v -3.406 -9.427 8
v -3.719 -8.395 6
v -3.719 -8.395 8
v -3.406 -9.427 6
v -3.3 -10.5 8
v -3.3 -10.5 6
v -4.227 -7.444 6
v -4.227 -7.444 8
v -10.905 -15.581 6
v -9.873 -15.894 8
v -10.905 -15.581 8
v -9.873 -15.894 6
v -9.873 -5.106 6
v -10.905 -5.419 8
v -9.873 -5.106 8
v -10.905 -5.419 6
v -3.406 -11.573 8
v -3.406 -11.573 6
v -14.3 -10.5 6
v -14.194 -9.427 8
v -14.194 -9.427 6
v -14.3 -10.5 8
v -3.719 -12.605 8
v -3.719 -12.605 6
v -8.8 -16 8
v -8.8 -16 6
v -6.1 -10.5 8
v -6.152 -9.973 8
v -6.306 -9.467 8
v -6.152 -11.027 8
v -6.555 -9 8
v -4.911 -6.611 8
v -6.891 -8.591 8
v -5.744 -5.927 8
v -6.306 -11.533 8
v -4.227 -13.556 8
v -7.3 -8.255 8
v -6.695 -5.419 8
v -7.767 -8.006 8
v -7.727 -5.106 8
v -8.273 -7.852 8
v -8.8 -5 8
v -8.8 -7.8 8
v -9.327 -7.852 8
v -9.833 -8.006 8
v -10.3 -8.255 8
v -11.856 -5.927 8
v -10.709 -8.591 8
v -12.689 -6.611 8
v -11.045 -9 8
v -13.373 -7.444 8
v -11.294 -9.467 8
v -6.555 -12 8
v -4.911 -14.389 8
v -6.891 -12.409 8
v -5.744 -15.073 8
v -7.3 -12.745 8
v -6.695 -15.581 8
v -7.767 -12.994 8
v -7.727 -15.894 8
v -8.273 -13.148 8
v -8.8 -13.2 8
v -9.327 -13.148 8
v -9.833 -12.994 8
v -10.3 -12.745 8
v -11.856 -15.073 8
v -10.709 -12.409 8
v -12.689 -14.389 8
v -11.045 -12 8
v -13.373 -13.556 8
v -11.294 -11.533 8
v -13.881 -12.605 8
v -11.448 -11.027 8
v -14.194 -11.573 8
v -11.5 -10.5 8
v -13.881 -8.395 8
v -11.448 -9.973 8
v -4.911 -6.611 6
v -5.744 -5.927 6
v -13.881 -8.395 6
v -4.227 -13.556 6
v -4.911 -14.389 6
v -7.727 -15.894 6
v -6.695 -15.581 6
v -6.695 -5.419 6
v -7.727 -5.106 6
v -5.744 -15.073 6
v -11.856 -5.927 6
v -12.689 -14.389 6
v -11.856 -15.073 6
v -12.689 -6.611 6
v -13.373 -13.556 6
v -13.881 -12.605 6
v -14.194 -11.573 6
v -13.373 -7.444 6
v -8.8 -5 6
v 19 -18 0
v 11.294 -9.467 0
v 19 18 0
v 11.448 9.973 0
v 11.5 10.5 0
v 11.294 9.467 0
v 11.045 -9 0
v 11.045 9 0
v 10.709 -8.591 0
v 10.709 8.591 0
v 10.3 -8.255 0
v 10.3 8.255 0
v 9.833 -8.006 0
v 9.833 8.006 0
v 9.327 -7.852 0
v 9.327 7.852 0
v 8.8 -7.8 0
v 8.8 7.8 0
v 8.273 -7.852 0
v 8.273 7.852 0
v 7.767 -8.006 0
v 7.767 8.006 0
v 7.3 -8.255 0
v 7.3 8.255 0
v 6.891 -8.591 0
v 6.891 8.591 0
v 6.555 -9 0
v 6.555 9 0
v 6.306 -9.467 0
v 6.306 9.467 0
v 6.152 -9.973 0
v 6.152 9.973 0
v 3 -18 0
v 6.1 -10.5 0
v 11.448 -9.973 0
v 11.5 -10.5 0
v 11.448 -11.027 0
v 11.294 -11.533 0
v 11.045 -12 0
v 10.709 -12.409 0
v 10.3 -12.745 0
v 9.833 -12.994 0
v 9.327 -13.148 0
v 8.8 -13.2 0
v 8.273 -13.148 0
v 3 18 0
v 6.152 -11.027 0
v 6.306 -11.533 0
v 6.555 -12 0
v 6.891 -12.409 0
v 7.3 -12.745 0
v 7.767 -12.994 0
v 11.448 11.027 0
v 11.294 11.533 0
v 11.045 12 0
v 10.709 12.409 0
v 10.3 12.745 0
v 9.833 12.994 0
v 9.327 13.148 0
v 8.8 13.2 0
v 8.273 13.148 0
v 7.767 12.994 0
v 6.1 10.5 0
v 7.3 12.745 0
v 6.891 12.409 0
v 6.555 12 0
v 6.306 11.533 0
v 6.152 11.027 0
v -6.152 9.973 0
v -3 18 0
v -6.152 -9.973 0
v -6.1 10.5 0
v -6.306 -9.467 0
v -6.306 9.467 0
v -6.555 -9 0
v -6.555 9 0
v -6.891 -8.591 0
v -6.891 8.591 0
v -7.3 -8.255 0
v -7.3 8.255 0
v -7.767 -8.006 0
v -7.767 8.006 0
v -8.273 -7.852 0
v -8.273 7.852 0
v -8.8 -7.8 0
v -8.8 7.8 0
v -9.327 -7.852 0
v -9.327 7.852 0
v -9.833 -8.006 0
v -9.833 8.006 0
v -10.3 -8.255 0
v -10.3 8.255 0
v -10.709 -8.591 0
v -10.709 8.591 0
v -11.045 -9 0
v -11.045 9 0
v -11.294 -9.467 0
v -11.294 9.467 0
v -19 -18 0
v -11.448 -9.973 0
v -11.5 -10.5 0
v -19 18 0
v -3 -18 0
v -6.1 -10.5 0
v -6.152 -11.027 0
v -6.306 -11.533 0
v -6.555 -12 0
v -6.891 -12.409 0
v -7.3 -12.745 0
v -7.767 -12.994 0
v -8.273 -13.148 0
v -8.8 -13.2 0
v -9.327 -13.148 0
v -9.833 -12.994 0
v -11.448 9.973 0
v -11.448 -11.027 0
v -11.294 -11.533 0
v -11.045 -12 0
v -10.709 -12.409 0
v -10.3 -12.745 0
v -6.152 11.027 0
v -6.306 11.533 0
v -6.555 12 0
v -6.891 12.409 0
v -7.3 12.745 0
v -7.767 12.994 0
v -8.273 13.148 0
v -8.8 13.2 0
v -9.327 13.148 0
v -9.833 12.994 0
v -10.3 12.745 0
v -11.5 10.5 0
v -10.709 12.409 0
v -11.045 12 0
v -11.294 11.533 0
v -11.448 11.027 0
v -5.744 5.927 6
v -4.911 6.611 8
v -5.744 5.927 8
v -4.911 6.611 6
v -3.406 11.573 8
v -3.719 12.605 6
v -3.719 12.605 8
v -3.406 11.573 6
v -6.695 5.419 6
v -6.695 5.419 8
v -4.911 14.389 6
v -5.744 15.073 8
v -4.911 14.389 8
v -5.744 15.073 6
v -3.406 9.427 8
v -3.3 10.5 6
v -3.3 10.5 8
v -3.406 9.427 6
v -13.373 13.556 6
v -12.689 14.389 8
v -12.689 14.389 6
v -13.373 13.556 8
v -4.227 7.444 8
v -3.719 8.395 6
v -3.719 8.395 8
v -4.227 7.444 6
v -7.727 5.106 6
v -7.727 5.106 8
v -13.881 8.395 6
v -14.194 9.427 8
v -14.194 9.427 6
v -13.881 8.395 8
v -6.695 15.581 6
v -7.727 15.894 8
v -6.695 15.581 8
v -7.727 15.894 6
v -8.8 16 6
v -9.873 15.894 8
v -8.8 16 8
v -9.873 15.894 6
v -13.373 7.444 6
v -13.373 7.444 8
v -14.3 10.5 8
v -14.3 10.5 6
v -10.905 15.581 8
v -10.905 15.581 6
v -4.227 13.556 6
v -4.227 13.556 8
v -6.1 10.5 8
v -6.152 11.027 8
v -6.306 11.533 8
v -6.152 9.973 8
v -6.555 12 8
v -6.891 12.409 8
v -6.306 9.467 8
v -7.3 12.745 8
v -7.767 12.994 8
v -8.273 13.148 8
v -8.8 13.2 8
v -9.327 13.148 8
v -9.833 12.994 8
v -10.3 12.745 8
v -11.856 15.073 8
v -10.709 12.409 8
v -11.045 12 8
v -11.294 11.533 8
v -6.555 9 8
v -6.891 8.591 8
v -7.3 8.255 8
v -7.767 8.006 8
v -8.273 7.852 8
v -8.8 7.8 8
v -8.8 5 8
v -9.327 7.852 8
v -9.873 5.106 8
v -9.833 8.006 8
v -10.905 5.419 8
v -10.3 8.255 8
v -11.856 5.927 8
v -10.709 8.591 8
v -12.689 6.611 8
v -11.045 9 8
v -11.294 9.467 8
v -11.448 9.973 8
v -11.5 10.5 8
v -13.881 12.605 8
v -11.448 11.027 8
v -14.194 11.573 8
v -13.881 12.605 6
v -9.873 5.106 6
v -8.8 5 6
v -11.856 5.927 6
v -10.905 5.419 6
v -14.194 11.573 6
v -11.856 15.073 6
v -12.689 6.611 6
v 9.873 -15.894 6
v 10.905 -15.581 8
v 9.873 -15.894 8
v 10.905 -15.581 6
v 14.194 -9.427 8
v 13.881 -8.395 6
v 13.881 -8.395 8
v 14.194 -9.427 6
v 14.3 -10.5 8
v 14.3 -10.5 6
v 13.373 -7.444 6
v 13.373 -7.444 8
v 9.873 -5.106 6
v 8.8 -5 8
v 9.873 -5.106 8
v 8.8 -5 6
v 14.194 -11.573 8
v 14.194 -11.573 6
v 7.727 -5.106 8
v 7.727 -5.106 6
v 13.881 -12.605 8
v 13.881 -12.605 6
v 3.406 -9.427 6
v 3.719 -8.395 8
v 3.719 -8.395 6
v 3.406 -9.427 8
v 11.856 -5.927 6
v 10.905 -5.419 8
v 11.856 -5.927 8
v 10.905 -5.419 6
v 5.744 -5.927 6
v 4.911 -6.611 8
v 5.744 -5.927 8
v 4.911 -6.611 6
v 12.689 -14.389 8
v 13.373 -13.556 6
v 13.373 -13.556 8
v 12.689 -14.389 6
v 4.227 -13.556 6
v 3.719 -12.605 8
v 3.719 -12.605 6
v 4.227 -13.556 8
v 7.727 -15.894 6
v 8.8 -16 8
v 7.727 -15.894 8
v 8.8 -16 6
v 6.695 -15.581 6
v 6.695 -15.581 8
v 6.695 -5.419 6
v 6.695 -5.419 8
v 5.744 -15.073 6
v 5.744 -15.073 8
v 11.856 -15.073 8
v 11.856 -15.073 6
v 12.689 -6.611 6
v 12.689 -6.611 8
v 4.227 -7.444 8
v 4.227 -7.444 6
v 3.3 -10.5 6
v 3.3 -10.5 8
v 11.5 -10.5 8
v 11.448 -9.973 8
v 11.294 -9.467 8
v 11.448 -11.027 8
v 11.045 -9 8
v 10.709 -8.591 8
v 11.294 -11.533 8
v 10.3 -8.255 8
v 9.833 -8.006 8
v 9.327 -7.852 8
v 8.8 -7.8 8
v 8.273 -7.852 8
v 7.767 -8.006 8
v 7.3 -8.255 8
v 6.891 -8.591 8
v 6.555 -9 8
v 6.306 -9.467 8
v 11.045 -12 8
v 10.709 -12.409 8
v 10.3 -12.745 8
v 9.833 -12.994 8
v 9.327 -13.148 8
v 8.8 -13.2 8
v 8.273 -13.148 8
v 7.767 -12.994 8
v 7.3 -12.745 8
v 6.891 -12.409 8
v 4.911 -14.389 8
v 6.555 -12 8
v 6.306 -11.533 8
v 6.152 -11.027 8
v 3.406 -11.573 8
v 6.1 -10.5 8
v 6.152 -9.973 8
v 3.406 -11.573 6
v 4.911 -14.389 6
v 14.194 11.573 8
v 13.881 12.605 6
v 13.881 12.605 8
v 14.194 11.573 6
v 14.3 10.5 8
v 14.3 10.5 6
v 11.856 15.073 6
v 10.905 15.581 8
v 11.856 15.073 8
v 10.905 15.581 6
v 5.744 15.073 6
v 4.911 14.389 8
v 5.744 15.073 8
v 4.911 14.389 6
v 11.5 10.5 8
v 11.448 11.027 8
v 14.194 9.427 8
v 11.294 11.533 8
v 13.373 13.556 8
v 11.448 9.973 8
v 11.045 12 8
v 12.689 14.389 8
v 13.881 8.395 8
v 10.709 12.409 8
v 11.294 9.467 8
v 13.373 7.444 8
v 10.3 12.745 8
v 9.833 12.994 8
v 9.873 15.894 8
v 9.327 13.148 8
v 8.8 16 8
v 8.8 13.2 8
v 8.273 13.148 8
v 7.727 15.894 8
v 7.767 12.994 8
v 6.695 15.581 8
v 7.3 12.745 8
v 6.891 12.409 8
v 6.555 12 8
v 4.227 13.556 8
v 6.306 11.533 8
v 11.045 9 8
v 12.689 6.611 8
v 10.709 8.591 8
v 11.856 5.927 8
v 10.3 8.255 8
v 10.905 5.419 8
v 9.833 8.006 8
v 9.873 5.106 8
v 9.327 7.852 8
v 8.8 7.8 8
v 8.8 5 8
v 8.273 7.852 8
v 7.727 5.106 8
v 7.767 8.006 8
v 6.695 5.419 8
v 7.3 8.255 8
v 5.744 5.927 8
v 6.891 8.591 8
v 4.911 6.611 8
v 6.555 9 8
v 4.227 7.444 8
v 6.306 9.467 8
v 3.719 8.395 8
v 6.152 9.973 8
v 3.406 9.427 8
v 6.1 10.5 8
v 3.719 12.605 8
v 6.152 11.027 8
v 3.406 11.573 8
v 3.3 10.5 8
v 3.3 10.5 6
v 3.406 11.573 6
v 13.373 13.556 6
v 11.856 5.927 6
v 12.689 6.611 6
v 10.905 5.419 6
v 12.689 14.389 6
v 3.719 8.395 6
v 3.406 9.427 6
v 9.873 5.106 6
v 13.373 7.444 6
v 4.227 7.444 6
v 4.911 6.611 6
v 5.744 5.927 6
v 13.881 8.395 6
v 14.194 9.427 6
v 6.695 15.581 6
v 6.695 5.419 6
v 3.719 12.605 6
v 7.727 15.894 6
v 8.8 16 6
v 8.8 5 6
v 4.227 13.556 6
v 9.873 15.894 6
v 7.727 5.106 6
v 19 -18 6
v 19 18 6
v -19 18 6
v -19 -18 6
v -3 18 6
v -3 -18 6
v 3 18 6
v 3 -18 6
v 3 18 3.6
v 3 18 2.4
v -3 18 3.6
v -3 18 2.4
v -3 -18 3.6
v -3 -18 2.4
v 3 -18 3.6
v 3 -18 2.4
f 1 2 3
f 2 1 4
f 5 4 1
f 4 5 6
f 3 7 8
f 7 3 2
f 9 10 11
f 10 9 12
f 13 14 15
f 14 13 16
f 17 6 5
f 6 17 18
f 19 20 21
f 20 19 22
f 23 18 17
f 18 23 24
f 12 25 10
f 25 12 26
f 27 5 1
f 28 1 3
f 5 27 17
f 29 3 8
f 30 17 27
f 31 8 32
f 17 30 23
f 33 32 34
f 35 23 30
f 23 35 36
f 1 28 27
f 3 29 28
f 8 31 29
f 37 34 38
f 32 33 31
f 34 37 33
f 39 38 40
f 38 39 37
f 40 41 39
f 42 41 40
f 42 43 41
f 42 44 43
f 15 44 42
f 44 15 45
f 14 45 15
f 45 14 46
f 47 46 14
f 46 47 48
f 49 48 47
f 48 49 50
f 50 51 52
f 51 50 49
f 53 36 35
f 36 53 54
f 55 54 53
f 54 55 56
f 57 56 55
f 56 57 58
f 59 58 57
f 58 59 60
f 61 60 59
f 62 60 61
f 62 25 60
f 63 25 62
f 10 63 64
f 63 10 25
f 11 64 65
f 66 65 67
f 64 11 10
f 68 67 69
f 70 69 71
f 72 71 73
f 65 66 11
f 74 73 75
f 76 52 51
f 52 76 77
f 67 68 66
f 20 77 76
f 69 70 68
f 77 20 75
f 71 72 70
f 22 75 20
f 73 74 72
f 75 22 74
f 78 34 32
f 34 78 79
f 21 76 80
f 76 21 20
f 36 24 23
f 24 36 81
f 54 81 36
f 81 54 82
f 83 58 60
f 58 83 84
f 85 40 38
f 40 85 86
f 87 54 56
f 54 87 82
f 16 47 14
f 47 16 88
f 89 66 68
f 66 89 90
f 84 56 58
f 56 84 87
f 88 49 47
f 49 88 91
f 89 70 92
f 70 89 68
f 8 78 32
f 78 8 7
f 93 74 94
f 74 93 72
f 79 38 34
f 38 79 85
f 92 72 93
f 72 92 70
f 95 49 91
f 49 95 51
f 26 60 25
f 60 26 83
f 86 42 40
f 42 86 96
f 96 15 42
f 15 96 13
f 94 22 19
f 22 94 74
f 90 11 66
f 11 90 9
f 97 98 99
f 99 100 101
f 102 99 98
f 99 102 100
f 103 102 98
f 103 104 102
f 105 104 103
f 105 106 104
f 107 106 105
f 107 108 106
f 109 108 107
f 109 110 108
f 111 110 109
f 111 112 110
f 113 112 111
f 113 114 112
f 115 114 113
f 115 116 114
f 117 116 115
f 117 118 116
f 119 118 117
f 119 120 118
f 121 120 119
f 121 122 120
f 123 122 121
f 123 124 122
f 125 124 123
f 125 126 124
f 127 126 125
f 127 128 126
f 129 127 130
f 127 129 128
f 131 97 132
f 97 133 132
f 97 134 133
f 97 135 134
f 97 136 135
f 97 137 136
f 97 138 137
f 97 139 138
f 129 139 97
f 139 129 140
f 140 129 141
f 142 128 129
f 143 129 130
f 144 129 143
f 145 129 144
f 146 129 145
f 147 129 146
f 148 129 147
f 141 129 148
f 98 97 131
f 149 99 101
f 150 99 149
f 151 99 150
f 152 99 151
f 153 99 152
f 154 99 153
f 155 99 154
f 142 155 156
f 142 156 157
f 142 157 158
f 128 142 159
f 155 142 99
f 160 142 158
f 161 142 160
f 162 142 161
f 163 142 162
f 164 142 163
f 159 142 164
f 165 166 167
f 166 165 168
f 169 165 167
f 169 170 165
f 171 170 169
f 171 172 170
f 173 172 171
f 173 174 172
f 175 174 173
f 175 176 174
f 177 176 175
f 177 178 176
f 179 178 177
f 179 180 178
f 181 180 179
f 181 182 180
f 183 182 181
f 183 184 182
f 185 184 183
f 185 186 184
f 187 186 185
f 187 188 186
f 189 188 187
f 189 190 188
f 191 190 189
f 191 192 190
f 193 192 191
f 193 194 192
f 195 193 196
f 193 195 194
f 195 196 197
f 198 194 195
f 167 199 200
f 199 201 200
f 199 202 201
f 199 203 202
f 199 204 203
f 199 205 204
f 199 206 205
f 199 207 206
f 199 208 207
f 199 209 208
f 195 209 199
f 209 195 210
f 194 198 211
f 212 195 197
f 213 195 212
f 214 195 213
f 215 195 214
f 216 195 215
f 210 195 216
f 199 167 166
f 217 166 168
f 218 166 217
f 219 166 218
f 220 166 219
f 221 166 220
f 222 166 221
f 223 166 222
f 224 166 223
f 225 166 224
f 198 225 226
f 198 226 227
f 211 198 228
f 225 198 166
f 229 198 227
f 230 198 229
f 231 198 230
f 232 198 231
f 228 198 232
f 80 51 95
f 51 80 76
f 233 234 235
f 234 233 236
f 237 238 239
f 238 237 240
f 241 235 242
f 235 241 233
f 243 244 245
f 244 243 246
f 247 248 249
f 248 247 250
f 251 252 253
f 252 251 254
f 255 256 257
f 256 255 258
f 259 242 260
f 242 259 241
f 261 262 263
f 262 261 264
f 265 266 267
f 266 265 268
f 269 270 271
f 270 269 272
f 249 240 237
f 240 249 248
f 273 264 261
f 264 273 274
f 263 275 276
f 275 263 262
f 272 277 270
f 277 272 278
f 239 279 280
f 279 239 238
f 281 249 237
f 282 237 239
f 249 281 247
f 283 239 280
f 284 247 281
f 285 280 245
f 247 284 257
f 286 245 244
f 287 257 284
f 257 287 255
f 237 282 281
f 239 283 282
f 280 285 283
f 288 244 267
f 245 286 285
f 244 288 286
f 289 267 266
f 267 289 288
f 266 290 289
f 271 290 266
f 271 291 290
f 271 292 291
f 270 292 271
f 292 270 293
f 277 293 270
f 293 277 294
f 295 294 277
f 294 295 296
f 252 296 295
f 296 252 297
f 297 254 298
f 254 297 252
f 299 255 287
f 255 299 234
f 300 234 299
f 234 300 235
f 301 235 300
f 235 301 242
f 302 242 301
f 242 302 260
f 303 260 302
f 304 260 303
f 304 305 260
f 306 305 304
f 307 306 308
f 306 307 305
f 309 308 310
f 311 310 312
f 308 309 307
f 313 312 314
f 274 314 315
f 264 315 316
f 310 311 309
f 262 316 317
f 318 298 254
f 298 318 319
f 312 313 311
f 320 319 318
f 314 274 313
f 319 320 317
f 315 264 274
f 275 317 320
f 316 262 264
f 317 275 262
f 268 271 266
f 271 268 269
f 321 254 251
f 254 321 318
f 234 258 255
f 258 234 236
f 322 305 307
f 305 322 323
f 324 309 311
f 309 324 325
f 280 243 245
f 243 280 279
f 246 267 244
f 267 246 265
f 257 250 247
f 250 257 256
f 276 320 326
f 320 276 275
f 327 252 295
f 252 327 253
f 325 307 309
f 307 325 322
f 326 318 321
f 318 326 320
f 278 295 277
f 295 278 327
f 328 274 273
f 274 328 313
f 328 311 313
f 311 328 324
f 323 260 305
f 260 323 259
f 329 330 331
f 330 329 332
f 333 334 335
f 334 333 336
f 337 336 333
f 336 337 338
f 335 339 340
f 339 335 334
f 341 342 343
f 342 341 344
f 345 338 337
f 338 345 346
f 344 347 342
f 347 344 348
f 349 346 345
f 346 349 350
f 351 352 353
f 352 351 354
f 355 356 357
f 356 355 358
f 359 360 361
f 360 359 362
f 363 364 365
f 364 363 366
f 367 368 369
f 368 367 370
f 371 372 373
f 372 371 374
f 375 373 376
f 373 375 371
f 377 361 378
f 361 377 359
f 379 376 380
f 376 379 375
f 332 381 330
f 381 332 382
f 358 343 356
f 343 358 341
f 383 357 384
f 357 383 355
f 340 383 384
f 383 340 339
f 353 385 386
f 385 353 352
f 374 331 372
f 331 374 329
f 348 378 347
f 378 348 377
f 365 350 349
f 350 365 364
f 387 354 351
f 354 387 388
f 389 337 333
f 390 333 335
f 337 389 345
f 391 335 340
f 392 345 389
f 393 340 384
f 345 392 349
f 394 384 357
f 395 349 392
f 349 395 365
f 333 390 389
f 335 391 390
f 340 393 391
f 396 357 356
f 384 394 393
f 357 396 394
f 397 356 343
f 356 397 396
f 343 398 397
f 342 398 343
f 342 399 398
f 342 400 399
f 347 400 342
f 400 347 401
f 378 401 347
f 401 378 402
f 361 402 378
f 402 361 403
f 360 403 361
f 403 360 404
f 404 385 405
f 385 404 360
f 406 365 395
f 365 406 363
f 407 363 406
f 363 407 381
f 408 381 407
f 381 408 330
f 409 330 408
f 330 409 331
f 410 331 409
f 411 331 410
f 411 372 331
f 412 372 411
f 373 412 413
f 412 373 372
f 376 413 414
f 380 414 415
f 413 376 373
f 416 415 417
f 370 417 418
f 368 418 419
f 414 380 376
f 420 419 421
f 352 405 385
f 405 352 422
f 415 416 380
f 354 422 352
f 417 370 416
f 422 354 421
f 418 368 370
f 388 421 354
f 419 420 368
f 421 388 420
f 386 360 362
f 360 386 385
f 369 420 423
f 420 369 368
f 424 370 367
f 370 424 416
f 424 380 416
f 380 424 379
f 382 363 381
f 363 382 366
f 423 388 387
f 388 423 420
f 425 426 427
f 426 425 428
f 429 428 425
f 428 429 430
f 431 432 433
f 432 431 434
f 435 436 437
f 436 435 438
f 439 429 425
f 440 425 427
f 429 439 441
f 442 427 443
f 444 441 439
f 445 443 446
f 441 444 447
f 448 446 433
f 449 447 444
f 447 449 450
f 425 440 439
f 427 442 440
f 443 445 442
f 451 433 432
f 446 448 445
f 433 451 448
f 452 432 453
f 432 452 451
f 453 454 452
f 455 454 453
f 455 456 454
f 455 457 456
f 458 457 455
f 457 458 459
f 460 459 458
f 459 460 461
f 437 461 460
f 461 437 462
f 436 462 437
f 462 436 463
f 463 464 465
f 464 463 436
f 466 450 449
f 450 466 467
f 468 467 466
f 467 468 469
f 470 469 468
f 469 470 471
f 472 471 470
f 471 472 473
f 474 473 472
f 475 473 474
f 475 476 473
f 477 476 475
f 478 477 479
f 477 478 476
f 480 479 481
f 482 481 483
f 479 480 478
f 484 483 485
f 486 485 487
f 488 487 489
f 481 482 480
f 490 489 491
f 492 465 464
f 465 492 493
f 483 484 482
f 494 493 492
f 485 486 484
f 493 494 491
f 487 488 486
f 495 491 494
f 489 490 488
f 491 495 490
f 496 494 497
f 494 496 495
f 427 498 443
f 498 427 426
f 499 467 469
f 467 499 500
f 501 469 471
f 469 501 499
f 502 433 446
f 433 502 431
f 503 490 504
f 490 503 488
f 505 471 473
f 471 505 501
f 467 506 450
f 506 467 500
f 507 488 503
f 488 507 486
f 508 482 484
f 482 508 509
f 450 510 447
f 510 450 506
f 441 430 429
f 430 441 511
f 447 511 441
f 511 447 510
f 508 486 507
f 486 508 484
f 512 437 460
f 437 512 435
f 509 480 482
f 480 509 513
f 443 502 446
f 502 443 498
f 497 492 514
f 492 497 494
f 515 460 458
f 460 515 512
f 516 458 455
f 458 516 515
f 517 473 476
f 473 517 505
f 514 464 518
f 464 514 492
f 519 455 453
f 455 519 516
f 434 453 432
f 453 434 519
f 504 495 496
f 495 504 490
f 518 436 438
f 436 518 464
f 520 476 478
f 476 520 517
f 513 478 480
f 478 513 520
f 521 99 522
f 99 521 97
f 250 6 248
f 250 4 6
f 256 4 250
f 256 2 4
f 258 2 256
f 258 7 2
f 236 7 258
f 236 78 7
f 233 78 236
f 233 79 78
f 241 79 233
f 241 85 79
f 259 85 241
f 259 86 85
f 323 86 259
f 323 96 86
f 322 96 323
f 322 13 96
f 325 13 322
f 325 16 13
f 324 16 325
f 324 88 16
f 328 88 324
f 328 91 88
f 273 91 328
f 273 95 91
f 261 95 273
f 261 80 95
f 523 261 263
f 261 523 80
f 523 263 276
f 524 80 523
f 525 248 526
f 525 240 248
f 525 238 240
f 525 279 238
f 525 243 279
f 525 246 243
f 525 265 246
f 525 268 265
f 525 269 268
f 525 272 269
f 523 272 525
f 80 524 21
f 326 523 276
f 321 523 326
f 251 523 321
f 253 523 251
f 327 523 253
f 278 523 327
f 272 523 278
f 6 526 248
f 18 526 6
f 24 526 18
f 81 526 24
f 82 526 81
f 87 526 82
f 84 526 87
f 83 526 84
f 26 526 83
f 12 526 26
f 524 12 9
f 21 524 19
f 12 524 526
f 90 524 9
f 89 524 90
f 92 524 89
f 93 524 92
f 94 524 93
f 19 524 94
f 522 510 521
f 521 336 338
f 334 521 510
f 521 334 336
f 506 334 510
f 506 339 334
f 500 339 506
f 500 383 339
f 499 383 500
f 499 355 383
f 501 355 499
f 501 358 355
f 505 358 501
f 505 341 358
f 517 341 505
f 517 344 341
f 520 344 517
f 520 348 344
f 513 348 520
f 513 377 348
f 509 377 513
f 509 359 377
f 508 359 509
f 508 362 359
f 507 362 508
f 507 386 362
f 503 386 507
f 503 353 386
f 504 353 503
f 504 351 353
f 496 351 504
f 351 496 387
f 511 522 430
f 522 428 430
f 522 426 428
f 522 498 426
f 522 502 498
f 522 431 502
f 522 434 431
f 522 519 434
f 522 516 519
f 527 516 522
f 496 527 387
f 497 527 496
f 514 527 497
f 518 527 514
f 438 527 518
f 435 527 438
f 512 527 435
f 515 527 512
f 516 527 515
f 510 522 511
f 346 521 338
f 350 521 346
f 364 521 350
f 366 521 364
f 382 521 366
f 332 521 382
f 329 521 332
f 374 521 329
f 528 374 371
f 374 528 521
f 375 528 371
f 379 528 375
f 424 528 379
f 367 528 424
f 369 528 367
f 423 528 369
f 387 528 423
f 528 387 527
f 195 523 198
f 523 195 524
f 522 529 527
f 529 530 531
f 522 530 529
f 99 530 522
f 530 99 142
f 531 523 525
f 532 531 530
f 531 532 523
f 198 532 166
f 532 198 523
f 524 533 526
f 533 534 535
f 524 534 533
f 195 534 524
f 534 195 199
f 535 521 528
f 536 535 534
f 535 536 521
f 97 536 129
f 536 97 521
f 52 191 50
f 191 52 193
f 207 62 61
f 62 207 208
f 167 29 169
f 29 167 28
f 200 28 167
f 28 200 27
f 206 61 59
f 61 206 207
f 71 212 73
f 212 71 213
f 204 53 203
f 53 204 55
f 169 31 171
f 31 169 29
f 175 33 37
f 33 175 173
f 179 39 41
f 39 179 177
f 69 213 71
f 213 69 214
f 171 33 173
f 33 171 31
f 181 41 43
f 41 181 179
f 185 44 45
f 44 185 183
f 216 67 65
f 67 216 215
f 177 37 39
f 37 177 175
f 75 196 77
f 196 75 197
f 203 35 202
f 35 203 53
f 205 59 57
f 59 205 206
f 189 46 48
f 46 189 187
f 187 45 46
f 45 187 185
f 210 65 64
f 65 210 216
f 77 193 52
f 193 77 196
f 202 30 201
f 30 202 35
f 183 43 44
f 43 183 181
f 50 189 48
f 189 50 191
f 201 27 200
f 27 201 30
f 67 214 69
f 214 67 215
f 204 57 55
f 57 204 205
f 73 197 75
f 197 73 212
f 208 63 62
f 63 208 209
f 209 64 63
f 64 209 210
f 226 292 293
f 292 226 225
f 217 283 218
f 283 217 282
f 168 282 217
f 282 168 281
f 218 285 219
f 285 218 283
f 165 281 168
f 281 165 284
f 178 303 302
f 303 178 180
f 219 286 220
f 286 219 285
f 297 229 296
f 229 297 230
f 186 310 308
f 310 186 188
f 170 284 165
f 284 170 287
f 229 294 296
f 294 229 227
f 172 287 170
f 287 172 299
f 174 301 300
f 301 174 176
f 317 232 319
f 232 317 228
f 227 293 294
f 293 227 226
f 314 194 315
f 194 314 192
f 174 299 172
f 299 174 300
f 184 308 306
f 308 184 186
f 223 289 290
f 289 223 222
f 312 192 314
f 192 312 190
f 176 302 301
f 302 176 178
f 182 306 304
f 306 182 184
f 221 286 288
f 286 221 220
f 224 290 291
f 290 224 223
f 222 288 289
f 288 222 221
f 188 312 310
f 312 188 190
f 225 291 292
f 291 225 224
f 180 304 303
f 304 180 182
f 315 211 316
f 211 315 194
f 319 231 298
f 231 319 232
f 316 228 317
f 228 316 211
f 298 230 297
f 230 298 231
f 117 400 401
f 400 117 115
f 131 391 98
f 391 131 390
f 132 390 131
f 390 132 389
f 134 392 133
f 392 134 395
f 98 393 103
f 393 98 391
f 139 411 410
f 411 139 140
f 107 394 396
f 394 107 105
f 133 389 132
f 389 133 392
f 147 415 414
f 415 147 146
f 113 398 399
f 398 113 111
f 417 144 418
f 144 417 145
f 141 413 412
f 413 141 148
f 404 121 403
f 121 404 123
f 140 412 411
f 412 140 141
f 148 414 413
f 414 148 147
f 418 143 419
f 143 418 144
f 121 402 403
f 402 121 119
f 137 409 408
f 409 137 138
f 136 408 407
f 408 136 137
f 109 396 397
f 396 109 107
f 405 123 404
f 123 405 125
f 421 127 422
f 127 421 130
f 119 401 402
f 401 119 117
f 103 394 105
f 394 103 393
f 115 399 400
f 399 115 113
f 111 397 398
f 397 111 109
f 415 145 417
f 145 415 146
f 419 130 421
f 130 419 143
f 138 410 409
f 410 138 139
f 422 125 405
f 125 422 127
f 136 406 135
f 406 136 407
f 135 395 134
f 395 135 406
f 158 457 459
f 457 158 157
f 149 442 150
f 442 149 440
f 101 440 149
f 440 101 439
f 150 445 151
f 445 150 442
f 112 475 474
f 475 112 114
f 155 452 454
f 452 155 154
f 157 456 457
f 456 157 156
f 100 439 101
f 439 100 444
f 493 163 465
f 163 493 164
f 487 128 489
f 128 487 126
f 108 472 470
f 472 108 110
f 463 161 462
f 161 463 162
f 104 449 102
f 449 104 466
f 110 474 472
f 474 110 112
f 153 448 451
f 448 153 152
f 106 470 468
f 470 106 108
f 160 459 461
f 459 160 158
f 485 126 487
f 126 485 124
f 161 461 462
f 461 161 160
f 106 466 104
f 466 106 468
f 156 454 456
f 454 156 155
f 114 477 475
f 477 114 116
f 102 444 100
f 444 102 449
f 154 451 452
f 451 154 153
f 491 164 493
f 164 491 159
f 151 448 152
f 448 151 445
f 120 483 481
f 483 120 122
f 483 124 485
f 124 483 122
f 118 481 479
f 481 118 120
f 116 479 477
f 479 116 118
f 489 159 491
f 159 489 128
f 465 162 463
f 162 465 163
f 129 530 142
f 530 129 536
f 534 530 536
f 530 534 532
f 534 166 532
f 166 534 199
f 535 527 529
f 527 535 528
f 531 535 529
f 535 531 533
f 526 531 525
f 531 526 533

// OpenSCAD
$fn = 32;

// ----------------------------------------------------------------------
// Living hinge: 38 x 36 mm plates, 1.2 mm flexible web
// ----------------------------------------------------------------------

// --- parameters (mm) ---
plate_len = 16;           // plate length outside the web
plate_w = 36;             // plate width
thick = 6;                // plate thickness
web_half = 3;             // half width of the flex band
web_t = 1.2;              // flexible web thickness
web_z = 2.4;              // web position inside the thickness
boss_d = 11;              // screw boss diameter
boss_h = 8;               // screw boss height
boss_x = 8.8;             // screw boss distance from the web
screw_d = 5.4;            // screw hole

difference() {
  union() {
    /* one flat strip, later thinned at the middle */
    translate([-19, -18, 0]) cube([38, 36, 6]);
    /* screw bosses, sunk 0.5 mm into the plates */
    for (sx = [-8.8, 8.8]) {
      for (sy = [-10.5, 10.5]) {
        translate([sx, sy, 0]) cylinder(h = boss_h, d = boss_d);
      }
    }
  }
  /* channel from below: leaves the web on top of it */
  translate([-3, -20.5, -2.5]) cube([6, 41, 4.9]);
  /* channel from above: thins the web down to web_t */
  translate([-3, -20.5, 3.6]) cube([6, 41, 4.9]);
  /* screw holes through the bosses */
  for (sx = [-8.8, 8.8]) {
    for (sy = [-10.5, 10.5]) {
      translate([sx, sy, -2.5]) cylinder(h = boss_h + 5, d = screw_d);
    }
  }
}
